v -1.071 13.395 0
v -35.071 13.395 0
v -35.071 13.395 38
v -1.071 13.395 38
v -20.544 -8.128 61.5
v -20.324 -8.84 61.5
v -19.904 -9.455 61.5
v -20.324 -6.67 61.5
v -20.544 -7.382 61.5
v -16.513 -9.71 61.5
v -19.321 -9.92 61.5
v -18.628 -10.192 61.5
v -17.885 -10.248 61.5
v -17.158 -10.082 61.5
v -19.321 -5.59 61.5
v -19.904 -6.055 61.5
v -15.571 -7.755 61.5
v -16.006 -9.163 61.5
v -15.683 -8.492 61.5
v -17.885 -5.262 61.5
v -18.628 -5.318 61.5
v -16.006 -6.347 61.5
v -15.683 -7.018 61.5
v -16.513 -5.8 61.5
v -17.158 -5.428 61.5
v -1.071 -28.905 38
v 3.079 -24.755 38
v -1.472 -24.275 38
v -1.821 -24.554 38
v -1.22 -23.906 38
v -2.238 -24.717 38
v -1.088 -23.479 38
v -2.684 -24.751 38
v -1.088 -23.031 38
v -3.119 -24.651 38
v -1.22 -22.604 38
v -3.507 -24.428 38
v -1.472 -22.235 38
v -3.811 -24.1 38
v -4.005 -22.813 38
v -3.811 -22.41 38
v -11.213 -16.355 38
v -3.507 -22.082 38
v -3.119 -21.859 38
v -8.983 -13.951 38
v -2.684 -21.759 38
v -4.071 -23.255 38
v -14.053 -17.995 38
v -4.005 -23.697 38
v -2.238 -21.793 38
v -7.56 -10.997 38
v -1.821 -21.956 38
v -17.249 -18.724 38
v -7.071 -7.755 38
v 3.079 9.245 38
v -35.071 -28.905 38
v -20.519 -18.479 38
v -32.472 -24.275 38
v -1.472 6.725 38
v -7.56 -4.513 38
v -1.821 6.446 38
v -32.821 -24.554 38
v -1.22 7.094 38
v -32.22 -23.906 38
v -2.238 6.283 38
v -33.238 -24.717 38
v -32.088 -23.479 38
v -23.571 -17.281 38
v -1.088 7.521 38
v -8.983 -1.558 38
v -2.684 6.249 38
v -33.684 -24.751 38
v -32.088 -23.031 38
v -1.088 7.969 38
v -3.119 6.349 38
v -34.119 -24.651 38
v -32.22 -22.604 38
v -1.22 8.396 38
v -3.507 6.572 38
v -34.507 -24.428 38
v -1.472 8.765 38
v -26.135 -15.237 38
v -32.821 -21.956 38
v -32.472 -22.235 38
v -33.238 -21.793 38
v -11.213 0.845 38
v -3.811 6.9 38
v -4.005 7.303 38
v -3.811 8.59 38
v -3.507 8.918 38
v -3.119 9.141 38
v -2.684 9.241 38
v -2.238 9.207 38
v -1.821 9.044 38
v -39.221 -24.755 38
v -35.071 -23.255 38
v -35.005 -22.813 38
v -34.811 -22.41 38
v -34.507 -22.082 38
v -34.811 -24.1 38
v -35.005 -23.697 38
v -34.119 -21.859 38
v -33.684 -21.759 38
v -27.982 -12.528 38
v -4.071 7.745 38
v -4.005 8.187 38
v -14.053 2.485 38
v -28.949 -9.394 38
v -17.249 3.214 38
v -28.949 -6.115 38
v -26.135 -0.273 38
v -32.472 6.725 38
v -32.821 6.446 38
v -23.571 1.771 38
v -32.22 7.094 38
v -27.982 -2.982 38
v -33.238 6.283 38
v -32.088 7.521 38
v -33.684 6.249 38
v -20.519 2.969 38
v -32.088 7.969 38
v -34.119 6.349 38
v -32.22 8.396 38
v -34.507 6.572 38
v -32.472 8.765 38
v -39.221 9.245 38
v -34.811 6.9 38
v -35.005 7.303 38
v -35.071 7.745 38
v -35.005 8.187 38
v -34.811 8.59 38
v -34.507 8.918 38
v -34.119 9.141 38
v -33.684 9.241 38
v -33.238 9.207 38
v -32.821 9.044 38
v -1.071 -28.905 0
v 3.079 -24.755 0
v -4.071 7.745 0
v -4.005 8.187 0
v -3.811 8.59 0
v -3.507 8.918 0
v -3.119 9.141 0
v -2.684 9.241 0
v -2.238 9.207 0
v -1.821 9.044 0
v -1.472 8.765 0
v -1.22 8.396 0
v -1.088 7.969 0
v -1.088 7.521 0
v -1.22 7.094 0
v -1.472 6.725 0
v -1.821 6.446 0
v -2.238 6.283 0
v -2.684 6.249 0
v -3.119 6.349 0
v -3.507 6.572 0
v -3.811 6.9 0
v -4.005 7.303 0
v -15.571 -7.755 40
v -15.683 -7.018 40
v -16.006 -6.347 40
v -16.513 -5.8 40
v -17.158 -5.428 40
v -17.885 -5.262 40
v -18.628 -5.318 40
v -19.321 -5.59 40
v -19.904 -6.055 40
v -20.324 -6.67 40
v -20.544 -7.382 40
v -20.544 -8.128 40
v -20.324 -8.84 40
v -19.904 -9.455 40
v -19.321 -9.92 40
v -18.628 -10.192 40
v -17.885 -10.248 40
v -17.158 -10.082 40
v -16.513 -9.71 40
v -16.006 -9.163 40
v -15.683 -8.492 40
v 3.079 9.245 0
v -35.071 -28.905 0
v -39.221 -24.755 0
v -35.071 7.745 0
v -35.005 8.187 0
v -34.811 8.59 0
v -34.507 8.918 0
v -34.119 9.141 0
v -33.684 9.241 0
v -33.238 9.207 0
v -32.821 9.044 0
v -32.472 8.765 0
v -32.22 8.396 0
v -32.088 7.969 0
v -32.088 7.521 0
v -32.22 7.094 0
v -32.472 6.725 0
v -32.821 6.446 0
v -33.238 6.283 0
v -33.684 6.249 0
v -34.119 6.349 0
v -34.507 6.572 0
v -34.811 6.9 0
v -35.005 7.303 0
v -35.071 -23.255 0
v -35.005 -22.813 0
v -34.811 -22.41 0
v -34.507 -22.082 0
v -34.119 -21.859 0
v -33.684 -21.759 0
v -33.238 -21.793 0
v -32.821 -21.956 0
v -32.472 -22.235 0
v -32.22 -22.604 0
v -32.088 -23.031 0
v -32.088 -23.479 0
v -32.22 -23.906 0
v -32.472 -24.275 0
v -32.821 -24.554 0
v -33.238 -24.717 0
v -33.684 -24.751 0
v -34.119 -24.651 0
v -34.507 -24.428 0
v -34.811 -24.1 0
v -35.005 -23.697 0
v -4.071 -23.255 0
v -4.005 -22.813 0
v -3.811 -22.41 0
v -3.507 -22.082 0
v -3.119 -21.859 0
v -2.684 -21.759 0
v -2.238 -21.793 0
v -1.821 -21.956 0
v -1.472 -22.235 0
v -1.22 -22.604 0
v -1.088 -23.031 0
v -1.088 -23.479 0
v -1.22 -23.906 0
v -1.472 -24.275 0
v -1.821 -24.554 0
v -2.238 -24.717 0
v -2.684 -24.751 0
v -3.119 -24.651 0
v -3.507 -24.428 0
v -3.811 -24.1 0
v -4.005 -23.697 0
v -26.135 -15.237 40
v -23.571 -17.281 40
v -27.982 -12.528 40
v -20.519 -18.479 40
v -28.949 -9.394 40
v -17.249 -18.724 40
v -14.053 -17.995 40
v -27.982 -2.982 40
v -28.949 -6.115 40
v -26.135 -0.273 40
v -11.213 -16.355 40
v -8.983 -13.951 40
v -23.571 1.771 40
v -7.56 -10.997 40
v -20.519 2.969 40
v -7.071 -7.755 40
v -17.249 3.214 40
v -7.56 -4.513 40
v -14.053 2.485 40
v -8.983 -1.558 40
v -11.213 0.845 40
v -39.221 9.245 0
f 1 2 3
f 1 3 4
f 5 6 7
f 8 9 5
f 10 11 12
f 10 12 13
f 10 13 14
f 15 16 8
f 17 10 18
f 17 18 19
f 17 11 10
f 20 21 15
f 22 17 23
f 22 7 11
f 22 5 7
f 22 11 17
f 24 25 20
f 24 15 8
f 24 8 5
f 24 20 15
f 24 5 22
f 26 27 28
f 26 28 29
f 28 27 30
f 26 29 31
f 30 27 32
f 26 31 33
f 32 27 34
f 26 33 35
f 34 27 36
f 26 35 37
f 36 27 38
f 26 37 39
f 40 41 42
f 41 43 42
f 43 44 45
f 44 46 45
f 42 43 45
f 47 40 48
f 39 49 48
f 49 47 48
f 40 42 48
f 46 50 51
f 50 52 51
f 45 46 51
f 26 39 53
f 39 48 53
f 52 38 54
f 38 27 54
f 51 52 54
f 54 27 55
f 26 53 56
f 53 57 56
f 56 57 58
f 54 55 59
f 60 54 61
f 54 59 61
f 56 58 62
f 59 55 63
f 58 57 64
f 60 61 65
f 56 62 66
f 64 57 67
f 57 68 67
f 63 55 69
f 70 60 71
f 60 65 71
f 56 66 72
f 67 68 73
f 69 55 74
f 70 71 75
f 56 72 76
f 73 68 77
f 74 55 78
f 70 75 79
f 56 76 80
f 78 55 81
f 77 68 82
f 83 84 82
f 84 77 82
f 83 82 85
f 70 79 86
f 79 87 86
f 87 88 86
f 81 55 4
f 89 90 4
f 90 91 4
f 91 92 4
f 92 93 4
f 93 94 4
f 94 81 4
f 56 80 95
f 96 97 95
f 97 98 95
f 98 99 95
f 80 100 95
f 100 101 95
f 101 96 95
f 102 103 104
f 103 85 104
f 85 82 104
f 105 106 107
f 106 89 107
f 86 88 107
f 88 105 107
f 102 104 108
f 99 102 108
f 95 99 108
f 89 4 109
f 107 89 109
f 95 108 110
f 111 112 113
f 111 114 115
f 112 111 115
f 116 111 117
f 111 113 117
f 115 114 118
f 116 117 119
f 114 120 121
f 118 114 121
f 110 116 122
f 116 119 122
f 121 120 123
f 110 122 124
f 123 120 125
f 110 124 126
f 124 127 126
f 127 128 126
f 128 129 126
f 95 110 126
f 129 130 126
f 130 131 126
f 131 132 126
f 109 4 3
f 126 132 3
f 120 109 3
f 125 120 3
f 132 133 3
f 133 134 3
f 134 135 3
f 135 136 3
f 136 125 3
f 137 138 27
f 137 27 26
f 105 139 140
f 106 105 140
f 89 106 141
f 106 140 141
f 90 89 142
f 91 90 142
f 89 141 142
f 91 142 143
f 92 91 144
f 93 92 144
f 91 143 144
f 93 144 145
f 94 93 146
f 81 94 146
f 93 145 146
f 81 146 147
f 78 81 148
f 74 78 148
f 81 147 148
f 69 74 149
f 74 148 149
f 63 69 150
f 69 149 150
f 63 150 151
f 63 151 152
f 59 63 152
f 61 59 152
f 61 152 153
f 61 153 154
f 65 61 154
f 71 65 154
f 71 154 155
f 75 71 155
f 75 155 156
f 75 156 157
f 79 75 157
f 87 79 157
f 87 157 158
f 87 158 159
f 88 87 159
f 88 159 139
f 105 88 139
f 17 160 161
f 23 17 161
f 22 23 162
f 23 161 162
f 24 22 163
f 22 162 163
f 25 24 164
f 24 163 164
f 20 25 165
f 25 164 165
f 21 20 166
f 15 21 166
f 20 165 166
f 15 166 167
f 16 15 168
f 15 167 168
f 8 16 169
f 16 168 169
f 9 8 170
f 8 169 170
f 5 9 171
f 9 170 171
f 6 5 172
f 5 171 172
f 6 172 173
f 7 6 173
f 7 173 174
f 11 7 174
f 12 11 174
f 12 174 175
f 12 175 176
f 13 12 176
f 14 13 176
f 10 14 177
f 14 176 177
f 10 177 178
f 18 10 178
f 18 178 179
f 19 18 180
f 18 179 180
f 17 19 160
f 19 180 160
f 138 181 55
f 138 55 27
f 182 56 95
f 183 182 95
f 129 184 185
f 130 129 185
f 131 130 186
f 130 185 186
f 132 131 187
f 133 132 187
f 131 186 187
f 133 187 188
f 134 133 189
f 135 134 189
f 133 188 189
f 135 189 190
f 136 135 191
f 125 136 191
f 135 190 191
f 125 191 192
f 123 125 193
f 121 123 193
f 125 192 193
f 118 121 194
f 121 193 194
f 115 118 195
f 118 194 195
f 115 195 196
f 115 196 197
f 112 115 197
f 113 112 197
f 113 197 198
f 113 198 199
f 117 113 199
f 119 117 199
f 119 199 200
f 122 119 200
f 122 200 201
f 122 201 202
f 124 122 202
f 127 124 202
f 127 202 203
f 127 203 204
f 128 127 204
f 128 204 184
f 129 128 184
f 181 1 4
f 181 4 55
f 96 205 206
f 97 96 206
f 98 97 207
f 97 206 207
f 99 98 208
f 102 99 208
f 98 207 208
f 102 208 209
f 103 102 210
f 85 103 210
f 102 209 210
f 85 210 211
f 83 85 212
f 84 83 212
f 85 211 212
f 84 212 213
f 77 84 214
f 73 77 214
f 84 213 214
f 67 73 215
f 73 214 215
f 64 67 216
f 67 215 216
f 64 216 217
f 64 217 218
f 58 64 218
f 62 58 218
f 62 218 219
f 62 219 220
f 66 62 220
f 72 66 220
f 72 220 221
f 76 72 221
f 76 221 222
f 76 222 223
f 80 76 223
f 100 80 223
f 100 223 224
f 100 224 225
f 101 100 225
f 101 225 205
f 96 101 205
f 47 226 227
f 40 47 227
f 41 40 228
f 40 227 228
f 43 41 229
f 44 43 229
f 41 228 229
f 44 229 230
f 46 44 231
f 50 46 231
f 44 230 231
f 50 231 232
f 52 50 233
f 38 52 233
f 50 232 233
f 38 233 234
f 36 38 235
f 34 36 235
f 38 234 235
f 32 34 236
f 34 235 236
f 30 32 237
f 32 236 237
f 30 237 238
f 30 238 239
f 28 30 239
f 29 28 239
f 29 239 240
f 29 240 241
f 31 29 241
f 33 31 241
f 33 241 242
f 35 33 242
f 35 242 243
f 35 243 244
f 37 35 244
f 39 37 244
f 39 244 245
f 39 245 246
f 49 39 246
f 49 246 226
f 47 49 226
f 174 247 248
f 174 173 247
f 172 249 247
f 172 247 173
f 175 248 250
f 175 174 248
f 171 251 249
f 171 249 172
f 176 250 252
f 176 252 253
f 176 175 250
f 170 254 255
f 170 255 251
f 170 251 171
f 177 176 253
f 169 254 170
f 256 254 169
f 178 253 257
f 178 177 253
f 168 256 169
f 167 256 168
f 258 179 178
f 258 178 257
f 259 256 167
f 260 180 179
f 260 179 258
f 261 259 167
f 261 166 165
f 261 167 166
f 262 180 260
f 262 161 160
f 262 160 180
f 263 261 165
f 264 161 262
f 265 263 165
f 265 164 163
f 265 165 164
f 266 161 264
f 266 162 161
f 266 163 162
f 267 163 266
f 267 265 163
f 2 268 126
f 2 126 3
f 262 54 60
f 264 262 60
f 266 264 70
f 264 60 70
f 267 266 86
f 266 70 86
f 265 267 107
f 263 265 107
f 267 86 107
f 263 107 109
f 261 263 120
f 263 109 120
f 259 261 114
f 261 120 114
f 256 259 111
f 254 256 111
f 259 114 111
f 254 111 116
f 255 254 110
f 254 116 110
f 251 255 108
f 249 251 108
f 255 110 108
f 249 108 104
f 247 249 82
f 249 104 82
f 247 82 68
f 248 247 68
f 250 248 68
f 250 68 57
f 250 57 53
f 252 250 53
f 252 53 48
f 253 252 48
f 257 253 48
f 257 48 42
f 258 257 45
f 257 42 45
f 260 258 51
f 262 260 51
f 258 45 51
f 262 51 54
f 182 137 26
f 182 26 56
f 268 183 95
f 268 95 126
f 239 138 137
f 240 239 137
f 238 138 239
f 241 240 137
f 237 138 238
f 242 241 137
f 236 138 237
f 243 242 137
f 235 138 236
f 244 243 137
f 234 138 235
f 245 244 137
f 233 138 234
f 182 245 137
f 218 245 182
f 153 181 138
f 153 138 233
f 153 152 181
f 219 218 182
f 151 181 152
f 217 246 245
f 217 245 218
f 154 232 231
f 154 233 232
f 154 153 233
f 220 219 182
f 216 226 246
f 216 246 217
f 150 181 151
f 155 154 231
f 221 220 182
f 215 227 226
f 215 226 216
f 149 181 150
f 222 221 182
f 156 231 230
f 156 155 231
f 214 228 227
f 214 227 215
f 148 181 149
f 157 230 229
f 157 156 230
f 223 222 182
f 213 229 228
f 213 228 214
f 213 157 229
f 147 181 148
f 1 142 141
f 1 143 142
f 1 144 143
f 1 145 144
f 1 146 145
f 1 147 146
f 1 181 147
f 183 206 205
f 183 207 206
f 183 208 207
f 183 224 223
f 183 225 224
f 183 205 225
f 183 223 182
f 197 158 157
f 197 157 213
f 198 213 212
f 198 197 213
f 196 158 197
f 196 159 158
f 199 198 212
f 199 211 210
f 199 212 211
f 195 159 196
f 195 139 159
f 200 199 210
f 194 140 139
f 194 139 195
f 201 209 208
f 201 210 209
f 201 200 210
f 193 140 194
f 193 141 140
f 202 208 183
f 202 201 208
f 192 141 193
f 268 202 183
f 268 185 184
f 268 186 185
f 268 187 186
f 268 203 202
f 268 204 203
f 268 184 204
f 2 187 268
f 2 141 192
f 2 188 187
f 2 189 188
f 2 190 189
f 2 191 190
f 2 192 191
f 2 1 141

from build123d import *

# Parameters (mm, degrees)
EXTRUDE_1_DEPTH     = 38
SKETCH_2_R          = 11
EXTRUDE_2_DEPTH     = 2
SKETCH_3_R          = 2.5
EXTRUDE_3_DEPTH     = 21.5
CUT_EXTRUDE_1_REACH = 80.461
SKETCH_4_R          = 1.5


with BuildPart() as part:
    # 草图1 → 凸台-拉伸1 (new body)
    with BuildSketch(Plane.XY):
        Polygon((-39.221447105, 9.245047294), (-35.071447105, 13.395047294), (-1.071447105, 13.395047294), (3.078552895, 9.245047294), (3.078552895, -24.754952706), (-1.071447105, -28.904952706), (-35.071447105, -28.904952706), (-39.221447105, -24.754952706), align=None)
    extrude(amount=EXTRUDE_1_DEPTH)

    # 草图2 → 凸台-拉伸2 (add)
    with BuildSketch(Plane.XY.offset(38)):
        with Locations((-18.071447105, -7.754952706)):
            Circle(SKETCH_2_R)
    extrude(amount=EXTRUDE_2_DEPTH)

    # 草图3 → 凸台-拉伸3 (add)
    with BuildSketch(Plane.XY.offset(40)):
        with Locations((-18.071447105, -7.754952706)):
            Circle(SKETCH_3_R)
    extrude(amount=EXTRUDE_3_DEPTH)

    # 草图4 → 切除-拉伸1 (cut, up to next)
    with BuildSketch(Plane(origin=(0, 0, 0), x_dir=(-1, 0, 0), z_dir=(0, 0, -1)), mode=Mode.PRIVATE) as cut_extrude_1_sk1:
        with Locations((2.571447105, 7.745047294)):
            Circle(SKETCH_4_R)
    cut_extrude_1_tool1 = extrude(cut_extrude_1_sk1.sketch, amount=-CUT_EXTRUDE_1_REACH, mode=Mode.PRIVATE) & part.part
    # 草图4 → 切除-拉伸1 (cut, up to next)
    with BuildSketch(Plane(origin=(0, 0, 0), x_dir=(-1, 0, 0), z_dir=(0, 0, -1)), mode=Mode.PRIVATE) as cut_extrude_1_sk2:
        with Locations((2.571447105, -23.254952706)):
            Circle(SKETCH_4_R)
    cut_extrude_1_tool2 = extrude(cut_extrude_1_sk2.sketch, amount=-CUT_EXTRUDE_1_REACH, mode=Mode.PRIVATE) & part.part
    # 草图4 → 切除-拉伸1 (cut, up to next)
    with BuildSketch(Plane(origin=(0, 0, 0), x_dir=(-1, 0, 0), z_dir=(0, 0, -1)), mode=Mode.PRIVATE) as cut_extrude_1_sk3:
        with Locations((33.571447105, -23.254952706)):
            Circle(SKETCH_4_R)
    cut_extrude_1_tool3 = extrude(cut_extrude_1_sk3.sketch, amount=-CUT_EXTRUDE_1_REACH, mode=Mode.PRIVATE) & part.part
    # 草图4 → 切除-拉伸1 (cut, up to next)
    with BuildSketch(Plane(origin=(0, 0, 0), x_dir=(-1, 0, 0), z_dir=(0, 0, -1)), mode=Mode.PRIVATE) as cut_extrude_1_sk4:
        with Locations((33.571447105, 7.745047294)):
            Circle(SKETCH_4_R)
    cut_extrude_1_tool4 = extrude(cut_extrude_1_sk4.sketch, amount=-CUT_EXTRUDE_1_REACH, mode=Mode.PRIVATE) & part.part
    add(cut_extrude_1_tool1.solids().sort_by_distance((-2.571447, 7.745047, 0))[0], mode=Mode.SUBTRACT)
    add(cut_extrude_1_tool2.solids().sort_by_distance((-2.571447, -23.254953, 0))[0], mode=Mode.SUBTRACT)
    add(cut_extrude_1_tool3.solids().sort_by_distance((-33.571447, -23.254953, 0))[0], mode=Mode.SUBTRACT)
    add(cut_extrude_1_tool4.solids().sort_by_distance((-33.571447, 7.745047, 0))[0], mode=Mode.SUBTRACT)


solid = part.part
